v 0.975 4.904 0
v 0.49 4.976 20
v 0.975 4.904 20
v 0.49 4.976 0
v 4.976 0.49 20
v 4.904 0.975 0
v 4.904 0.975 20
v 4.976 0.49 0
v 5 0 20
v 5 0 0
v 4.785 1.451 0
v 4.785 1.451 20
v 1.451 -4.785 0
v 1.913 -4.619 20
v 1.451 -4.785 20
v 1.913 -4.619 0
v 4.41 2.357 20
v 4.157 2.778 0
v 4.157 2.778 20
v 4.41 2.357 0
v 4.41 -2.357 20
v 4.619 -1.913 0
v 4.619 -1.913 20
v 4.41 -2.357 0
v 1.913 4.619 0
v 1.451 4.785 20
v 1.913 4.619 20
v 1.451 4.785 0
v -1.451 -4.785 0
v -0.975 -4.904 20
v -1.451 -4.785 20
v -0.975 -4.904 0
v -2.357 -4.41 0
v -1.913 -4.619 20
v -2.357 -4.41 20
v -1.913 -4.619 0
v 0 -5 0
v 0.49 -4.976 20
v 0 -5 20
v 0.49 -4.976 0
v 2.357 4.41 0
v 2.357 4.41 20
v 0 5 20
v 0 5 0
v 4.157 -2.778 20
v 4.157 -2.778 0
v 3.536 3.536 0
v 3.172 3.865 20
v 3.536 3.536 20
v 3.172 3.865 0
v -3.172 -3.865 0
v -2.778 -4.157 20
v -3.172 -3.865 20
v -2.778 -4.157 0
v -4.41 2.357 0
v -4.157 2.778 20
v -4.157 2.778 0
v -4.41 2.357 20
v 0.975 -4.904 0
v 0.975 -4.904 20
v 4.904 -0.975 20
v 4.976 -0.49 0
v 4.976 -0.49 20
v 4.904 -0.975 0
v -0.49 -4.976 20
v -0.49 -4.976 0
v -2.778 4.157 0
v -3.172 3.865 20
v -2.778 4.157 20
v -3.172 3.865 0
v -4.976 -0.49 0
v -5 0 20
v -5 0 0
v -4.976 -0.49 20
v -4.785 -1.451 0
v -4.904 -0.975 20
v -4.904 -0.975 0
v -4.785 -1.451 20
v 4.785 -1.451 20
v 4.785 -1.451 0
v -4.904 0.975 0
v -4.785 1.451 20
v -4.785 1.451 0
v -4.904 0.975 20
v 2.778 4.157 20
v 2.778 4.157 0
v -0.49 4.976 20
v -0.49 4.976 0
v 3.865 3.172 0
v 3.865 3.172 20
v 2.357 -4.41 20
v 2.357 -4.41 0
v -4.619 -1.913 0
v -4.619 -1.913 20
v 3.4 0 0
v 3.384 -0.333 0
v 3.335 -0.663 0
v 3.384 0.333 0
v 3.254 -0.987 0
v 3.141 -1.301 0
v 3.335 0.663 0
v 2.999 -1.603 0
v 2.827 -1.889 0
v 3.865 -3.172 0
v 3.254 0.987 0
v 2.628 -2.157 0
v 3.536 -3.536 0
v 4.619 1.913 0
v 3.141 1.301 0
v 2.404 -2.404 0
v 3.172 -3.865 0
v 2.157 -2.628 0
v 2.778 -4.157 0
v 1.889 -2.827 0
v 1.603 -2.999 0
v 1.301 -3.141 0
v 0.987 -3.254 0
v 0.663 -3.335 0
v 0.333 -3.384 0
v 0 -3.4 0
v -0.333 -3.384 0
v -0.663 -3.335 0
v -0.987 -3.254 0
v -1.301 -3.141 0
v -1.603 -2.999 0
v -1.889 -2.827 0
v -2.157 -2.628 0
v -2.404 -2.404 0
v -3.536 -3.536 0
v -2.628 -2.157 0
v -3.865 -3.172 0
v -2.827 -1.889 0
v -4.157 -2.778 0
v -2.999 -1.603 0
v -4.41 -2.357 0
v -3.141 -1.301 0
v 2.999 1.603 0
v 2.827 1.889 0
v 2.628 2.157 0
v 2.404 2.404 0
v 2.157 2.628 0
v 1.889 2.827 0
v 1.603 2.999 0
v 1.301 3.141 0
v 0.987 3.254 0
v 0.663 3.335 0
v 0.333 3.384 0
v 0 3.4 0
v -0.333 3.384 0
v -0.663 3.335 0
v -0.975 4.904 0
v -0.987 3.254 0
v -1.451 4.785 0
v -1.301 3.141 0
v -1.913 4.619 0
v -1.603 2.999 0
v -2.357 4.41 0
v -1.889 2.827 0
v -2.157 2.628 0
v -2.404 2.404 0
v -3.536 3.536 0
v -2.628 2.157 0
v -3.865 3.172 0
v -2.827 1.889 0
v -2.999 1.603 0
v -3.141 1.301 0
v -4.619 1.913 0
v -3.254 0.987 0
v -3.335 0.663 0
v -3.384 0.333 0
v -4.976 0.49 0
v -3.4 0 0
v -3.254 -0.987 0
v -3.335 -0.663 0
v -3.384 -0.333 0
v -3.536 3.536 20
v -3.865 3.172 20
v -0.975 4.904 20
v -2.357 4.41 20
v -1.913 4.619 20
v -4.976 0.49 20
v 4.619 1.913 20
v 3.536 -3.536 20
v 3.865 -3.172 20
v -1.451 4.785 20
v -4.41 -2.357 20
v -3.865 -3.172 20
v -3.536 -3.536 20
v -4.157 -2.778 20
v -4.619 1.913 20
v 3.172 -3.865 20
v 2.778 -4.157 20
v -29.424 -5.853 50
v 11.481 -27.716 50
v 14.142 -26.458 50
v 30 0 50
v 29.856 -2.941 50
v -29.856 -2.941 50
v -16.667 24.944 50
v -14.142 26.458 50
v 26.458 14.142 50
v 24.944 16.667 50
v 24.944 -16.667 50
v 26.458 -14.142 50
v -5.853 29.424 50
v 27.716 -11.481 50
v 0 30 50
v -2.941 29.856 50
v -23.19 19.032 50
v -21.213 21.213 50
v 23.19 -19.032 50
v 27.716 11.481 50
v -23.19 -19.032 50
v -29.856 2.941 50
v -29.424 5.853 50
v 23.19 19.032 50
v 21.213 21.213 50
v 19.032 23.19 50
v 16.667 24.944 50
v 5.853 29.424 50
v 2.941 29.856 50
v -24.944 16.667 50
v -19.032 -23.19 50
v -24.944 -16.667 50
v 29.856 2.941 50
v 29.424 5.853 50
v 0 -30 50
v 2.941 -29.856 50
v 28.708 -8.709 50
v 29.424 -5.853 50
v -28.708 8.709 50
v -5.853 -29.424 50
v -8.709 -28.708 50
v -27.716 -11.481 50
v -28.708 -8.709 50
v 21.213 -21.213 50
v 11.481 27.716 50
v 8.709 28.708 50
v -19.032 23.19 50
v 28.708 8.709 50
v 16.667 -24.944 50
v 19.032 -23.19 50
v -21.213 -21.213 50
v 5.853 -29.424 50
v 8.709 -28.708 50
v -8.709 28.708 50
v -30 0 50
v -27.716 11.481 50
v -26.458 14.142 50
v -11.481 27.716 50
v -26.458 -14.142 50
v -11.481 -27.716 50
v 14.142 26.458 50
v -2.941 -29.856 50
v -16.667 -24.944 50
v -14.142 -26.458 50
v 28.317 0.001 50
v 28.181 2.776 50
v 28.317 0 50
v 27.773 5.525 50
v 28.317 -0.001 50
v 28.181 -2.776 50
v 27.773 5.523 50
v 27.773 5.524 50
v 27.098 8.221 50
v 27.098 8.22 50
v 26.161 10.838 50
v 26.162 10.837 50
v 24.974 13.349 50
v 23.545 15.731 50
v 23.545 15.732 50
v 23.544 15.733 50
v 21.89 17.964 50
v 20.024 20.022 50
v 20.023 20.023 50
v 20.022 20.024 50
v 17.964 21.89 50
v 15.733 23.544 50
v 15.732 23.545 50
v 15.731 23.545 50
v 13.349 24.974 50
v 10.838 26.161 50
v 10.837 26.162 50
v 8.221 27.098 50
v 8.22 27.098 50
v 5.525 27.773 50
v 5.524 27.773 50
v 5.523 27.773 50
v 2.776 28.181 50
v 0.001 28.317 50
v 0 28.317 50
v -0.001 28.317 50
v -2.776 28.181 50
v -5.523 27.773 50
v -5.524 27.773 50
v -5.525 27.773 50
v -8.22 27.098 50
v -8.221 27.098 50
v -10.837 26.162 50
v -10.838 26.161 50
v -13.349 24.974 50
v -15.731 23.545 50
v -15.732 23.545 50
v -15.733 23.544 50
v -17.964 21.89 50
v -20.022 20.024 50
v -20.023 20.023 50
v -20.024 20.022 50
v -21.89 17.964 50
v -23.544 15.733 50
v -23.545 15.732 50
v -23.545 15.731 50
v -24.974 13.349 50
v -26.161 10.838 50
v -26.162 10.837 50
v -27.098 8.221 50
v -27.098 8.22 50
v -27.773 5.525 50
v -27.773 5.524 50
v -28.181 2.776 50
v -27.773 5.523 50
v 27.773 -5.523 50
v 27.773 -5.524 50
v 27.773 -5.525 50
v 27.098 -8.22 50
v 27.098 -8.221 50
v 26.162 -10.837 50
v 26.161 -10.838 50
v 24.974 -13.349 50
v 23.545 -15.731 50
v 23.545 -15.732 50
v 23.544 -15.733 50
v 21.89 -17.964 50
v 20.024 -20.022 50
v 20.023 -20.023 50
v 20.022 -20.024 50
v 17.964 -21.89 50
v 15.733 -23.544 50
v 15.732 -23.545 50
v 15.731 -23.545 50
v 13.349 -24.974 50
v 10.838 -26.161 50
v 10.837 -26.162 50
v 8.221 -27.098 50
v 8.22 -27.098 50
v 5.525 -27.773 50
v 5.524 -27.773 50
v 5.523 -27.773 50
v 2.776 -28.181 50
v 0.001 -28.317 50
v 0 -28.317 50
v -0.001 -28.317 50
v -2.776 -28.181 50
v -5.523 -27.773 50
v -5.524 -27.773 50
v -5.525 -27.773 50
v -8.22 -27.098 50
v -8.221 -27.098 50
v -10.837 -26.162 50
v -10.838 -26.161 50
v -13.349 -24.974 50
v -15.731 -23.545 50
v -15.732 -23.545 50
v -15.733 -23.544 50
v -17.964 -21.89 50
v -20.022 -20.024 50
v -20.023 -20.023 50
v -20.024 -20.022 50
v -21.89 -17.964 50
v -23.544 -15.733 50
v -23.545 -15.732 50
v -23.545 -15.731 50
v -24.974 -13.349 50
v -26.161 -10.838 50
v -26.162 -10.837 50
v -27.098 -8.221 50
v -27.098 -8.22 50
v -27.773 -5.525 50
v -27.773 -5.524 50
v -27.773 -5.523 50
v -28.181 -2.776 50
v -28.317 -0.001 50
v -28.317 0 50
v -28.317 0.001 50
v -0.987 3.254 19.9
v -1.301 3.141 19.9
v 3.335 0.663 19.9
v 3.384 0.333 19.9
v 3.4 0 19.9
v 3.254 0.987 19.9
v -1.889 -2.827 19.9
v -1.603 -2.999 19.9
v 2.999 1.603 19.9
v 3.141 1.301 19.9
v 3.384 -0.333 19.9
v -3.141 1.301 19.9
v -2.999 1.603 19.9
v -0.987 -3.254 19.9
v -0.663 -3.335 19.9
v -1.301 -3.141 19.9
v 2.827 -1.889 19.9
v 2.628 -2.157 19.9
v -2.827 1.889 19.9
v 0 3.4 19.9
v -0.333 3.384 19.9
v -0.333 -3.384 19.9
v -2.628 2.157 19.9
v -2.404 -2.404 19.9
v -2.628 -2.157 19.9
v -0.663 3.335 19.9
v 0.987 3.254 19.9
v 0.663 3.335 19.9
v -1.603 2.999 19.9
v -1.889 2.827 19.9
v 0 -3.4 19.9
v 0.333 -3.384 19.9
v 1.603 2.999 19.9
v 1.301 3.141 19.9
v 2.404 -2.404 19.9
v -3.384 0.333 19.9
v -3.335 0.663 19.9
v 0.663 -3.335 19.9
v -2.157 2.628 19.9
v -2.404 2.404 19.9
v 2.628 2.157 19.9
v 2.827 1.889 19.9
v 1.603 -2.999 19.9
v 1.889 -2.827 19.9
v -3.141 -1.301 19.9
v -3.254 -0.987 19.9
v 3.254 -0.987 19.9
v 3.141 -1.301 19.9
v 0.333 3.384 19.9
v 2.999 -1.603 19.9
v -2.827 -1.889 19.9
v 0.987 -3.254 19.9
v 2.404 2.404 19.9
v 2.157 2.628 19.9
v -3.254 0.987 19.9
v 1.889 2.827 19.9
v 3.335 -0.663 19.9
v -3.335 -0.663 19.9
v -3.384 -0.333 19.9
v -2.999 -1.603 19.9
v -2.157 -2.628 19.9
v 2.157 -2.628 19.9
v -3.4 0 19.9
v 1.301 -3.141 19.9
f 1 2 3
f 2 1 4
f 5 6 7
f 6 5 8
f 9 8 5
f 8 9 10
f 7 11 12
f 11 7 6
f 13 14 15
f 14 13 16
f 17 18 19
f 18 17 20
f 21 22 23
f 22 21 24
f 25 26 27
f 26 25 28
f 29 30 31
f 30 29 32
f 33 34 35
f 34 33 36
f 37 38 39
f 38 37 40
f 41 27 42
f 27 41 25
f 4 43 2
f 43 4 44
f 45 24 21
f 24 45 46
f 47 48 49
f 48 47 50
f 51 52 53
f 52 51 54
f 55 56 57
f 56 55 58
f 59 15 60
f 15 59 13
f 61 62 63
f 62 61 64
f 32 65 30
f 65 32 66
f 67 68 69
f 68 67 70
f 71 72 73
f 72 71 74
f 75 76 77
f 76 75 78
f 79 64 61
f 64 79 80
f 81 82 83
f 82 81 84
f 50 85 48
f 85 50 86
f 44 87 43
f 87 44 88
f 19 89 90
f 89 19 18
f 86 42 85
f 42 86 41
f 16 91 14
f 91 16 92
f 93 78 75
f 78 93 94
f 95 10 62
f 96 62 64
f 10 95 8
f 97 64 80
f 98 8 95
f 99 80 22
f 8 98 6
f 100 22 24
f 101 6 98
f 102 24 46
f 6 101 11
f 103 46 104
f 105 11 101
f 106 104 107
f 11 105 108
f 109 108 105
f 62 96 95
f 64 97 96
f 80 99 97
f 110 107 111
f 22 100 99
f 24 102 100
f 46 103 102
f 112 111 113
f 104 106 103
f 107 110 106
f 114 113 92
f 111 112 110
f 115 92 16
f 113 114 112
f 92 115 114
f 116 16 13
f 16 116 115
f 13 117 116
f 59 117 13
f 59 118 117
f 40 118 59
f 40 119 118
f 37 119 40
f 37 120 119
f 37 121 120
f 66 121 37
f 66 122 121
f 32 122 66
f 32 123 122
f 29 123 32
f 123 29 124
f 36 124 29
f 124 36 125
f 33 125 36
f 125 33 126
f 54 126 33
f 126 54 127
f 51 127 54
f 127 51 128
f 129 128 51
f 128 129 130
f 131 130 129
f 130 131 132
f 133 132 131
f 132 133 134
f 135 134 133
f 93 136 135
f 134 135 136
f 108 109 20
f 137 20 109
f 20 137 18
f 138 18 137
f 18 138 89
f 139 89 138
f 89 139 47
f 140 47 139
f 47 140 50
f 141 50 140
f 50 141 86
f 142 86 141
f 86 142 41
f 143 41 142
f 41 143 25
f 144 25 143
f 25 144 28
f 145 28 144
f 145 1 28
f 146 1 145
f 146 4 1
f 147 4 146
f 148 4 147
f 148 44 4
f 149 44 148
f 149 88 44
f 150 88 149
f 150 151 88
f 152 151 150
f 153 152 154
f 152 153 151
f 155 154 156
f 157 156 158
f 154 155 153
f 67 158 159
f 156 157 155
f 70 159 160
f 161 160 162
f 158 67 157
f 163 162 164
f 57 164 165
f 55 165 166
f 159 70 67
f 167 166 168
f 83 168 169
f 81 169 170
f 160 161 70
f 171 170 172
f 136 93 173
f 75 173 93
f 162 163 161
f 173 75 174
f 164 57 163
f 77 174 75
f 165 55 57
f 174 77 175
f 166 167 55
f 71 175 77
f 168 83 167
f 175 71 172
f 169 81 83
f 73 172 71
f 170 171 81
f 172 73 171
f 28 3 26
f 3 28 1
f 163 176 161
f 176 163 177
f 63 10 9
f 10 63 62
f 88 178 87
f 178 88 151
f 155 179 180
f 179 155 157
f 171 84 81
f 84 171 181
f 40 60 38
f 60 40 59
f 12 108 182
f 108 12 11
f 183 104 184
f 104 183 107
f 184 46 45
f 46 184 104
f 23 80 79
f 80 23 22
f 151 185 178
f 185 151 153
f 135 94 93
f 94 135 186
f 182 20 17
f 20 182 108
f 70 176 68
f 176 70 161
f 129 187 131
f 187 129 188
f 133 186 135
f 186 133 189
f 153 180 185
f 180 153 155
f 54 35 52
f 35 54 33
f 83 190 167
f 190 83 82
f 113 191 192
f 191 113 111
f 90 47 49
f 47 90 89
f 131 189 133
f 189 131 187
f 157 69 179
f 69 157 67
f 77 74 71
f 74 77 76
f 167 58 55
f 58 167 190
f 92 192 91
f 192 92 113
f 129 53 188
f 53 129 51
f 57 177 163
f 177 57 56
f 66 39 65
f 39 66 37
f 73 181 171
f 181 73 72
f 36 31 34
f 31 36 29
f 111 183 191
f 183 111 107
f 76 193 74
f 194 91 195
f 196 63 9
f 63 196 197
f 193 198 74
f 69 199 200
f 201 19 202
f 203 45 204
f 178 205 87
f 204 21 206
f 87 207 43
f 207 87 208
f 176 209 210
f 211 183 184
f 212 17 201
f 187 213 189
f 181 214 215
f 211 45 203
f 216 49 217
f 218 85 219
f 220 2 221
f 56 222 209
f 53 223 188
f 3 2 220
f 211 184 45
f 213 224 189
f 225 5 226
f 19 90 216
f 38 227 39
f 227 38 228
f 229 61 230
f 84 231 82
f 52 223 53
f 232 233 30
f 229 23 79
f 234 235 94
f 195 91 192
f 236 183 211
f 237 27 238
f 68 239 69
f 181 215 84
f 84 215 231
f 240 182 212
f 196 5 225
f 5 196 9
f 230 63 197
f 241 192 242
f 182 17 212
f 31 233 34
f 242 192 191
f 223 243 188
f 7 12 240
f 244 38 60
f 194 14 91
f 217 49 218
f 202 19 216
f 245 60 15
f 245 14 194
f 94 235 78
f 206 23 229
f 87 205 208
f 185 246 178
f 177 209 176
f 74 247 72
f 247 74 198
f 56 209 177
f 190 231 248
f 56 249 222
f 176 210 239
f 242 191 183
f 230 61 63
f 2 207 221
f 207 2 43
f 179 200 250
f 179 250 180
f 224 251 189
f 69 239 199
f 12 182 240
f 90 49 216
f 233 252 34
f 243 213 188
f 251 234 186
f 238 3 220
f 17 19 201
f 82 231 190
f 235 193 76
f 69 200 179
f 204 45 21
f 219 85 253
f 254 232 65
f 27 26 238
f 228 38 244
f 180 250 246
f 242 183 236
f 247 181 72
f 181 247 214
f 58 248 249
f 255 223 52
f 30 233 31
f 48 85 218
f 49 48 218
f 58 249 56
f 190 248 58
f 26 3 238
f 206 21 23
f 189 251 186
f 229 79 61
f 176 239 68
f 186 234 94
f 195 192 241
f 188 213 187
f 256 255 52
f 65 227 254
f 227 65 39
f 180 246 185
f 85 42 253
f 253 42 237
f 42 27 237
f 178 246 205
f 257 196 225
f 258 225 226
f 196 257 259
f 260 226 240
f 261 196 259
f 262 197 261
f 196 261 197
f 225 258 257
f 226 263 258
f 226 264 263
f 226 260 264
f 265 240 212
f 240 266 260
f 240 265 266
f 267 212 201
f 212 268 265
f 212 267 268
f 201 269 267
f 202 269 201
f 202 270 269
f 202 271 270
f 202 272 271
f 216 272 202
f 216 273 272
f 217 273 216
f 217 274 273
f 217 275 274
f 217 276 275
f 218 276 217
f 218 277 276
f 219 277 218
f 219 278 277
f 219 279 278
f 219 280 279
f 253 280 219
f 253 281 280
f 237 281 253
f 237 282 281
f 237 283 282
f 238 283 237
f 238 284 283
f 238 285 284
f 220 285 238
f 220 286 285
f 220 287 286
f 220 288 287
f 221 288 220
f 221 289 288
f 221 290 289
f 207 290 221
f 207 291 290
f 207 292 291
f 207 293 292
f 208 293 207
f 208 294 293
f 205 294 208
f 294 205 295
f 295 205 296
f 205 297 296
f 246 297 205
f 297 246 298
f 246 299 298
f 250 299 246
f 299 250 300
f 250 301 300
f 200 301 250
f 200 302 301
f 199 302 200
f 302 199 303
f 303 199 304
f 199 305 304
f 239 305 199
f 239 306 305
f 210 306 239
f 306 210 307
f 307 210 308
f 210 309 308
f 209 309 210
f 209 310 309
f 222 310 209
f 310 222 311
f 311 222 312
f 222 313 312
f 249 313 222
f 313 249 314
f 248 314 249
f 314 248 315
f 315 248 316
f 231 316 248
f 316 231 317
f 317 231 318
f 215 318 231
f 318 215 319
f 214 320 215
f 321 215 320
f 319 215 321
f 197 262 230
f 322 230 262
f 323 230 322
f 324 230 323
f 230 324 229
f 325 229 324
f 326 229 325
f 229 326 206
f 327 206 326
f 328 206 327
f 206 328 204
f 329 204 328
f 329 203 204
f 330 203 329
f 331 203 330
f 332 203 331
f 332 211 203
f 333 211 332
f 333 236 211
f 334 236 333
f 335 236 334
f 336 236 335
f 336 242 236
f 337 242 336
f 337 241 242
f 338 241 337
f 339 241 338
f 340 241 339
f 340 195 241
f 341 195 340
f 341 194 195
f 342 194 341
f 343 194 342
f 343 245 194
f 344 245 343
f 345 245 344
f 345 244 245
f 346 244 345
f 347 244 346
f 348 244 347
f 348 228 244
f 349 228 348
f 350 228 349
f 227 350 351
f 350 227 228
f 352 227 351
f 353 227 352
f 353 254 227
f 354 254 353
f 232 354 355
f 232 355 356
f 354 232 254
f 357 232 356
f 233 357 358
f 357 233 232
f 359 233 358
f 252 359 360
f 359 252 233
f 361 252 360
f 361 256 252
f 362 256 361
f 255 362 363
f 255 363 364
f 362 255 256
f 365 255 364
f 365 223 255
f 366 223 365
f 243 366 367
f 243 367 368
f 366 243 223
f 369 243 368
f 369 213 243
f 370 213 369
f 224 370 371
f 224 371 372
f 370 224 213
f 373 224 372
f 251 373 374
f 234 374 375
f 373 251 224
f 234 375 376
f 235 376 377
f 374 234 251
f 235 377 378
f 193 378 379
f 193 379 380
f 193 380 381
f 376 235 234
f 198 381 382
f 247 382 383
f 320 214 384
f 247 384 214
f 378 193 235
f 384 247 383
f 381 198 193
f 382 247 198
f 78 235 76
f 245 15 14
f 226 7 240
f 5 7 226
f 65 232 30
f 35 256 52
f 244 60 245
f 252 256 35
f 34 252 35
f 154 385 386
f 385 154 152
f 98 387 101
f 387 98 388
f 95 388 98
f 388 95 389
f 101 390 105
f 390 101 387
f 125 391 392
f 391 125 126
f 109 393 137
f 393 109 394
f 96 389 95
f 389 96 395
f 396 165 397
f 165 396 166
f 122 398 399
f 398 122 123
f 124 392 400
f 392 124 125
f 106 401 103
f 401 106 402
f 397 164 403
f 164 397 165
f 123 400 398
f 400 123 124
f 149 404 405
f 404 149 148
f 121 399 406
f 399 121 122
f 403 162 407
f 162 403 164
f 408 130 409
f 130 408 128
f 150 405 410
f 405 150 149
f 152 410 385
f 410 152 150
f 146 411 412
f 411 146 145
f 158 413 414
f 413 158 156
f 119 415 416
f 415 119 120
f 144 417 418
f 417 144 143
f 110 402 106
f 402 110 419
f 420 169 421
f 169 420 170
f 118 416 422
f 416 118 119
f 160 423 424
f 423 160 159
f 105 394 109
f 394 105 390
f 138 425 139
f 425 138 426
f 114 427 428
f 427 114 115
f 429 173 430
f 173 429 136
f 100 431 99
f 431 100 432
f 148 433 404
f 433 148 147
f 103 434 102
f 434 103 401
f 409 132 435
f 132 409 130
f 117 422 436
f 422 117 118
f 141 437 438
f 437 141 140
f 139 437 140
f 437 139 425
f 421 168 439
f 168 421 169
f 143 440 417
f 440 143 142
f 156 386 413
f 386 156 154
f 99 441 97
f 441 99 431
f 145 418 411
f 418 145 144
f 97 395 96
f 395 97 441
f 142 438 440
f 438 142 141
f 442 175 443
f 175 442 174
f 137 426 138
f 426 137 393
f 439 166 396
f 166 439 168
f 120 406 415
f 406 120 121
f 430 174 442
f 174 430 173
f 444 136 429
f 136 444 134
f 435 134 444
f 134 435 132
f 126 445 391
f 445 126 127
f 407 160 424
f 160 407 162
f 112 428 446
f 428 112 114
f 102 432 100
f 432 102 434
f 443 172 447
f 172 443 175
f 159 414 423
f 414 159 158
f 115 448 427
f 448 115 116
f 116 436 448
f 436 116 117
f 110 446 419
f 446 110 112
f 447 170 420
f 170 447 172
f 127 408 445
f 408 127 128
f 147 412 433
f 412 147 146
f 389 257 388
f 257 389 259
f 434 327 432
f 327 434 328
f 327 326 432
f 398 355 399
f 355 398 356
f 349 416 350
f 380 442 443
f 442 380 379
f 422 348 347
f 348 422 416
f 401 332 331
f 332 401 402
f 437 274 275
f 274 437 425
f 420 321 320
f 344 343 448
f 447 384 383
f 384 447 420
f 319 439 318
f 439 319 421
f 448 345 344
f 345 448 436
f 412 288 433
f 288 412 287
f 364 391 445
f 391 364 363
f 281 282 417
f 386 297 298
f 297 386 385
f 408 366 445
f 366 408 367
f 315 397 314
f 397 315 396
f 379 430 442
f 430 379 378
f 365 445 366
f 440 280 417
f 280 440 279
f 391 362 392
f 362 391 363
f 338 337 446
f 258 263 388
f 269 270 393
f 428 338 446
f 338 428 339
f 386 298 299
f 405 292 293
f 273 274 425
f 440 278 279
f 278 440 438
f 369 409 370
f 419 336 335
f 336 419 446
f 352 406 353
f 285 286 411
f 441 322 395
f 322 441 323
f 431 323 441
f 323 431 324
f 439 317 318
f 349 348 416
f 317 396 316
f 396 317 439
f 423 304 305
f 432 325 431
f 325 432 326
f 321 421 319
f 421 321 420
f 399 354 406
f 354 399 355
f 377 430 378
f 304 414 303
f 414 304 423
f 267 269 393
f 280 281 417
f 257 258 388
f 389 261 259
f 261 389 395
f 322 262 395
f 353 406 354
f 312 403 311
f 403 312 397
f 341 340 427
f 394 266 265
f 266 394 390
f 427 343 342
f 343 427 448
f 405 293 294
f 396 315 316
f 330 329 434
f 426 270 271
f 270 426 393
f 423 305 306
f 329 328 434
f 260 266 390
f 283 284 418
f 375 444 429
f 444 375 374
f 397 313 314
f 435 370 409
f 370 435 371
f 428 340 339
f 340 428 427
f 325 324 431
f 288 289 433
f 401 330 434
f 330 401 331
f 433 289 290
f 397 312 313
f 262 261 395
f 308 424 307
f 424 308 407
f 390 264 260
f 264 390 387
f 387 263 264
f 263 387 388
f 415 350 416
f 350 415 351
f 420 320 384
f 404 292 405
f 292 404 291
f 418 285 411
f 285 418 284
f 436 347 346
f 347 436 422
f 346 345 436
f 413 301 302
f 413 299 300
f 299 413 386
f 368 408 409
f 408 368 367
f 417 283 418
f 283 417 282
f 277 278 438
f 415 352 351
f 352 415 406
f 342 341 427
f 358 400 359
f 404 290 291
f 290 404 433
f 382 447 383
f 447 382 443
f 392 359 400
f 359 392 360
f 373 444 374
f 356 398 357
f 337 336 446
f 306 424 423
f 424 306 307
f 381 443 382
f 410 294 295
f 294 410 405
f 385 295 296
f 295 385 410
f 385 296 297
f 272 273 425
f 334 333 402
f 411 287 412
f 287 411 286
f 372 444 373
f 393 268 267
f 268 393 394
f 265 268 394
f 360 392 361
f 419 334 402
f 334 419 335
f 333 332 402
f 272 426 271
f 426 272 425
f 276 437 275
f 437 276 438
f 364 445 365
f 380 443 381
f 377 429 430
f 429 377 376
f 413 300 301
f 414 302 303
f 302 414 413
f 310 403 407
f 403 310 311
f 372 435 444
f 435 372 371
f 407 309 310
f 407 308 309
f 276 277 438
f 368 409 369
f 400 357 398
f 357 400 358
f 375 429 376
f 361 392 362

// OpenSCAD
// Funnel dimensions (mm)
outer_d_spout = 10;          // outer diameter of the straight spout
outer_d_top   = 60;          // outer diameter at the funnel rim
wall_thickness = 1.6;        // uniform wall thickness
height_spout   = 20;         // spout height (z = 0 → 20)
height_cone    = 30;         // cone height (z = 20 → 50)
clearance = 0.1;             // extra length for cutting shapes (mm)

$fn = 64; // smooth circles and cones

// Derived inner diameters
inner_d_spout = outer_d_spout - 2*wall_thickness; // 6.8 mm
inner_r_spout = inner_d_spout/2;

inner_r_bottom = inner_r_spout; // at z = 20 (matches spout)
inner_r_top    = (outer_d_top/2) - wall_thickness; // 28.4 mm
inner_d_top    = inner_r_top*2; // 56.8 mm

module outer_funnel() {
    // Spout: cylinder from z=0 to z=height_spout
    cylinder(h = height_spout, d = outer_d_spout);
    // Cone: from z=height_spout to z=height_spout+height_cone
    translate([0,0,height_spout])
        cylinder(h = height_cone, r1 = outer_d_spout/2, r2 = outer_d_top/2);
}

module inner_funnel() {
    // Spout inner cylinder, extended beyond both faces
    translate([0,0,-clearance])
        cylinder(h = height_spout + 2*clearance, d = inner_d_spout);
    // Cone inner taper, extended beyond both faces
    translate([0,0,height_spout - clearance])
        cylinder(h = height_cone + 2*clearance,
                 r1 = inner_r_bottom,
                 r2 = inner_r_top);
}

// Final solid: outer minus inner (hollow funnel)
difference() {
    outer_funnel();
    inner_funnel();
}
